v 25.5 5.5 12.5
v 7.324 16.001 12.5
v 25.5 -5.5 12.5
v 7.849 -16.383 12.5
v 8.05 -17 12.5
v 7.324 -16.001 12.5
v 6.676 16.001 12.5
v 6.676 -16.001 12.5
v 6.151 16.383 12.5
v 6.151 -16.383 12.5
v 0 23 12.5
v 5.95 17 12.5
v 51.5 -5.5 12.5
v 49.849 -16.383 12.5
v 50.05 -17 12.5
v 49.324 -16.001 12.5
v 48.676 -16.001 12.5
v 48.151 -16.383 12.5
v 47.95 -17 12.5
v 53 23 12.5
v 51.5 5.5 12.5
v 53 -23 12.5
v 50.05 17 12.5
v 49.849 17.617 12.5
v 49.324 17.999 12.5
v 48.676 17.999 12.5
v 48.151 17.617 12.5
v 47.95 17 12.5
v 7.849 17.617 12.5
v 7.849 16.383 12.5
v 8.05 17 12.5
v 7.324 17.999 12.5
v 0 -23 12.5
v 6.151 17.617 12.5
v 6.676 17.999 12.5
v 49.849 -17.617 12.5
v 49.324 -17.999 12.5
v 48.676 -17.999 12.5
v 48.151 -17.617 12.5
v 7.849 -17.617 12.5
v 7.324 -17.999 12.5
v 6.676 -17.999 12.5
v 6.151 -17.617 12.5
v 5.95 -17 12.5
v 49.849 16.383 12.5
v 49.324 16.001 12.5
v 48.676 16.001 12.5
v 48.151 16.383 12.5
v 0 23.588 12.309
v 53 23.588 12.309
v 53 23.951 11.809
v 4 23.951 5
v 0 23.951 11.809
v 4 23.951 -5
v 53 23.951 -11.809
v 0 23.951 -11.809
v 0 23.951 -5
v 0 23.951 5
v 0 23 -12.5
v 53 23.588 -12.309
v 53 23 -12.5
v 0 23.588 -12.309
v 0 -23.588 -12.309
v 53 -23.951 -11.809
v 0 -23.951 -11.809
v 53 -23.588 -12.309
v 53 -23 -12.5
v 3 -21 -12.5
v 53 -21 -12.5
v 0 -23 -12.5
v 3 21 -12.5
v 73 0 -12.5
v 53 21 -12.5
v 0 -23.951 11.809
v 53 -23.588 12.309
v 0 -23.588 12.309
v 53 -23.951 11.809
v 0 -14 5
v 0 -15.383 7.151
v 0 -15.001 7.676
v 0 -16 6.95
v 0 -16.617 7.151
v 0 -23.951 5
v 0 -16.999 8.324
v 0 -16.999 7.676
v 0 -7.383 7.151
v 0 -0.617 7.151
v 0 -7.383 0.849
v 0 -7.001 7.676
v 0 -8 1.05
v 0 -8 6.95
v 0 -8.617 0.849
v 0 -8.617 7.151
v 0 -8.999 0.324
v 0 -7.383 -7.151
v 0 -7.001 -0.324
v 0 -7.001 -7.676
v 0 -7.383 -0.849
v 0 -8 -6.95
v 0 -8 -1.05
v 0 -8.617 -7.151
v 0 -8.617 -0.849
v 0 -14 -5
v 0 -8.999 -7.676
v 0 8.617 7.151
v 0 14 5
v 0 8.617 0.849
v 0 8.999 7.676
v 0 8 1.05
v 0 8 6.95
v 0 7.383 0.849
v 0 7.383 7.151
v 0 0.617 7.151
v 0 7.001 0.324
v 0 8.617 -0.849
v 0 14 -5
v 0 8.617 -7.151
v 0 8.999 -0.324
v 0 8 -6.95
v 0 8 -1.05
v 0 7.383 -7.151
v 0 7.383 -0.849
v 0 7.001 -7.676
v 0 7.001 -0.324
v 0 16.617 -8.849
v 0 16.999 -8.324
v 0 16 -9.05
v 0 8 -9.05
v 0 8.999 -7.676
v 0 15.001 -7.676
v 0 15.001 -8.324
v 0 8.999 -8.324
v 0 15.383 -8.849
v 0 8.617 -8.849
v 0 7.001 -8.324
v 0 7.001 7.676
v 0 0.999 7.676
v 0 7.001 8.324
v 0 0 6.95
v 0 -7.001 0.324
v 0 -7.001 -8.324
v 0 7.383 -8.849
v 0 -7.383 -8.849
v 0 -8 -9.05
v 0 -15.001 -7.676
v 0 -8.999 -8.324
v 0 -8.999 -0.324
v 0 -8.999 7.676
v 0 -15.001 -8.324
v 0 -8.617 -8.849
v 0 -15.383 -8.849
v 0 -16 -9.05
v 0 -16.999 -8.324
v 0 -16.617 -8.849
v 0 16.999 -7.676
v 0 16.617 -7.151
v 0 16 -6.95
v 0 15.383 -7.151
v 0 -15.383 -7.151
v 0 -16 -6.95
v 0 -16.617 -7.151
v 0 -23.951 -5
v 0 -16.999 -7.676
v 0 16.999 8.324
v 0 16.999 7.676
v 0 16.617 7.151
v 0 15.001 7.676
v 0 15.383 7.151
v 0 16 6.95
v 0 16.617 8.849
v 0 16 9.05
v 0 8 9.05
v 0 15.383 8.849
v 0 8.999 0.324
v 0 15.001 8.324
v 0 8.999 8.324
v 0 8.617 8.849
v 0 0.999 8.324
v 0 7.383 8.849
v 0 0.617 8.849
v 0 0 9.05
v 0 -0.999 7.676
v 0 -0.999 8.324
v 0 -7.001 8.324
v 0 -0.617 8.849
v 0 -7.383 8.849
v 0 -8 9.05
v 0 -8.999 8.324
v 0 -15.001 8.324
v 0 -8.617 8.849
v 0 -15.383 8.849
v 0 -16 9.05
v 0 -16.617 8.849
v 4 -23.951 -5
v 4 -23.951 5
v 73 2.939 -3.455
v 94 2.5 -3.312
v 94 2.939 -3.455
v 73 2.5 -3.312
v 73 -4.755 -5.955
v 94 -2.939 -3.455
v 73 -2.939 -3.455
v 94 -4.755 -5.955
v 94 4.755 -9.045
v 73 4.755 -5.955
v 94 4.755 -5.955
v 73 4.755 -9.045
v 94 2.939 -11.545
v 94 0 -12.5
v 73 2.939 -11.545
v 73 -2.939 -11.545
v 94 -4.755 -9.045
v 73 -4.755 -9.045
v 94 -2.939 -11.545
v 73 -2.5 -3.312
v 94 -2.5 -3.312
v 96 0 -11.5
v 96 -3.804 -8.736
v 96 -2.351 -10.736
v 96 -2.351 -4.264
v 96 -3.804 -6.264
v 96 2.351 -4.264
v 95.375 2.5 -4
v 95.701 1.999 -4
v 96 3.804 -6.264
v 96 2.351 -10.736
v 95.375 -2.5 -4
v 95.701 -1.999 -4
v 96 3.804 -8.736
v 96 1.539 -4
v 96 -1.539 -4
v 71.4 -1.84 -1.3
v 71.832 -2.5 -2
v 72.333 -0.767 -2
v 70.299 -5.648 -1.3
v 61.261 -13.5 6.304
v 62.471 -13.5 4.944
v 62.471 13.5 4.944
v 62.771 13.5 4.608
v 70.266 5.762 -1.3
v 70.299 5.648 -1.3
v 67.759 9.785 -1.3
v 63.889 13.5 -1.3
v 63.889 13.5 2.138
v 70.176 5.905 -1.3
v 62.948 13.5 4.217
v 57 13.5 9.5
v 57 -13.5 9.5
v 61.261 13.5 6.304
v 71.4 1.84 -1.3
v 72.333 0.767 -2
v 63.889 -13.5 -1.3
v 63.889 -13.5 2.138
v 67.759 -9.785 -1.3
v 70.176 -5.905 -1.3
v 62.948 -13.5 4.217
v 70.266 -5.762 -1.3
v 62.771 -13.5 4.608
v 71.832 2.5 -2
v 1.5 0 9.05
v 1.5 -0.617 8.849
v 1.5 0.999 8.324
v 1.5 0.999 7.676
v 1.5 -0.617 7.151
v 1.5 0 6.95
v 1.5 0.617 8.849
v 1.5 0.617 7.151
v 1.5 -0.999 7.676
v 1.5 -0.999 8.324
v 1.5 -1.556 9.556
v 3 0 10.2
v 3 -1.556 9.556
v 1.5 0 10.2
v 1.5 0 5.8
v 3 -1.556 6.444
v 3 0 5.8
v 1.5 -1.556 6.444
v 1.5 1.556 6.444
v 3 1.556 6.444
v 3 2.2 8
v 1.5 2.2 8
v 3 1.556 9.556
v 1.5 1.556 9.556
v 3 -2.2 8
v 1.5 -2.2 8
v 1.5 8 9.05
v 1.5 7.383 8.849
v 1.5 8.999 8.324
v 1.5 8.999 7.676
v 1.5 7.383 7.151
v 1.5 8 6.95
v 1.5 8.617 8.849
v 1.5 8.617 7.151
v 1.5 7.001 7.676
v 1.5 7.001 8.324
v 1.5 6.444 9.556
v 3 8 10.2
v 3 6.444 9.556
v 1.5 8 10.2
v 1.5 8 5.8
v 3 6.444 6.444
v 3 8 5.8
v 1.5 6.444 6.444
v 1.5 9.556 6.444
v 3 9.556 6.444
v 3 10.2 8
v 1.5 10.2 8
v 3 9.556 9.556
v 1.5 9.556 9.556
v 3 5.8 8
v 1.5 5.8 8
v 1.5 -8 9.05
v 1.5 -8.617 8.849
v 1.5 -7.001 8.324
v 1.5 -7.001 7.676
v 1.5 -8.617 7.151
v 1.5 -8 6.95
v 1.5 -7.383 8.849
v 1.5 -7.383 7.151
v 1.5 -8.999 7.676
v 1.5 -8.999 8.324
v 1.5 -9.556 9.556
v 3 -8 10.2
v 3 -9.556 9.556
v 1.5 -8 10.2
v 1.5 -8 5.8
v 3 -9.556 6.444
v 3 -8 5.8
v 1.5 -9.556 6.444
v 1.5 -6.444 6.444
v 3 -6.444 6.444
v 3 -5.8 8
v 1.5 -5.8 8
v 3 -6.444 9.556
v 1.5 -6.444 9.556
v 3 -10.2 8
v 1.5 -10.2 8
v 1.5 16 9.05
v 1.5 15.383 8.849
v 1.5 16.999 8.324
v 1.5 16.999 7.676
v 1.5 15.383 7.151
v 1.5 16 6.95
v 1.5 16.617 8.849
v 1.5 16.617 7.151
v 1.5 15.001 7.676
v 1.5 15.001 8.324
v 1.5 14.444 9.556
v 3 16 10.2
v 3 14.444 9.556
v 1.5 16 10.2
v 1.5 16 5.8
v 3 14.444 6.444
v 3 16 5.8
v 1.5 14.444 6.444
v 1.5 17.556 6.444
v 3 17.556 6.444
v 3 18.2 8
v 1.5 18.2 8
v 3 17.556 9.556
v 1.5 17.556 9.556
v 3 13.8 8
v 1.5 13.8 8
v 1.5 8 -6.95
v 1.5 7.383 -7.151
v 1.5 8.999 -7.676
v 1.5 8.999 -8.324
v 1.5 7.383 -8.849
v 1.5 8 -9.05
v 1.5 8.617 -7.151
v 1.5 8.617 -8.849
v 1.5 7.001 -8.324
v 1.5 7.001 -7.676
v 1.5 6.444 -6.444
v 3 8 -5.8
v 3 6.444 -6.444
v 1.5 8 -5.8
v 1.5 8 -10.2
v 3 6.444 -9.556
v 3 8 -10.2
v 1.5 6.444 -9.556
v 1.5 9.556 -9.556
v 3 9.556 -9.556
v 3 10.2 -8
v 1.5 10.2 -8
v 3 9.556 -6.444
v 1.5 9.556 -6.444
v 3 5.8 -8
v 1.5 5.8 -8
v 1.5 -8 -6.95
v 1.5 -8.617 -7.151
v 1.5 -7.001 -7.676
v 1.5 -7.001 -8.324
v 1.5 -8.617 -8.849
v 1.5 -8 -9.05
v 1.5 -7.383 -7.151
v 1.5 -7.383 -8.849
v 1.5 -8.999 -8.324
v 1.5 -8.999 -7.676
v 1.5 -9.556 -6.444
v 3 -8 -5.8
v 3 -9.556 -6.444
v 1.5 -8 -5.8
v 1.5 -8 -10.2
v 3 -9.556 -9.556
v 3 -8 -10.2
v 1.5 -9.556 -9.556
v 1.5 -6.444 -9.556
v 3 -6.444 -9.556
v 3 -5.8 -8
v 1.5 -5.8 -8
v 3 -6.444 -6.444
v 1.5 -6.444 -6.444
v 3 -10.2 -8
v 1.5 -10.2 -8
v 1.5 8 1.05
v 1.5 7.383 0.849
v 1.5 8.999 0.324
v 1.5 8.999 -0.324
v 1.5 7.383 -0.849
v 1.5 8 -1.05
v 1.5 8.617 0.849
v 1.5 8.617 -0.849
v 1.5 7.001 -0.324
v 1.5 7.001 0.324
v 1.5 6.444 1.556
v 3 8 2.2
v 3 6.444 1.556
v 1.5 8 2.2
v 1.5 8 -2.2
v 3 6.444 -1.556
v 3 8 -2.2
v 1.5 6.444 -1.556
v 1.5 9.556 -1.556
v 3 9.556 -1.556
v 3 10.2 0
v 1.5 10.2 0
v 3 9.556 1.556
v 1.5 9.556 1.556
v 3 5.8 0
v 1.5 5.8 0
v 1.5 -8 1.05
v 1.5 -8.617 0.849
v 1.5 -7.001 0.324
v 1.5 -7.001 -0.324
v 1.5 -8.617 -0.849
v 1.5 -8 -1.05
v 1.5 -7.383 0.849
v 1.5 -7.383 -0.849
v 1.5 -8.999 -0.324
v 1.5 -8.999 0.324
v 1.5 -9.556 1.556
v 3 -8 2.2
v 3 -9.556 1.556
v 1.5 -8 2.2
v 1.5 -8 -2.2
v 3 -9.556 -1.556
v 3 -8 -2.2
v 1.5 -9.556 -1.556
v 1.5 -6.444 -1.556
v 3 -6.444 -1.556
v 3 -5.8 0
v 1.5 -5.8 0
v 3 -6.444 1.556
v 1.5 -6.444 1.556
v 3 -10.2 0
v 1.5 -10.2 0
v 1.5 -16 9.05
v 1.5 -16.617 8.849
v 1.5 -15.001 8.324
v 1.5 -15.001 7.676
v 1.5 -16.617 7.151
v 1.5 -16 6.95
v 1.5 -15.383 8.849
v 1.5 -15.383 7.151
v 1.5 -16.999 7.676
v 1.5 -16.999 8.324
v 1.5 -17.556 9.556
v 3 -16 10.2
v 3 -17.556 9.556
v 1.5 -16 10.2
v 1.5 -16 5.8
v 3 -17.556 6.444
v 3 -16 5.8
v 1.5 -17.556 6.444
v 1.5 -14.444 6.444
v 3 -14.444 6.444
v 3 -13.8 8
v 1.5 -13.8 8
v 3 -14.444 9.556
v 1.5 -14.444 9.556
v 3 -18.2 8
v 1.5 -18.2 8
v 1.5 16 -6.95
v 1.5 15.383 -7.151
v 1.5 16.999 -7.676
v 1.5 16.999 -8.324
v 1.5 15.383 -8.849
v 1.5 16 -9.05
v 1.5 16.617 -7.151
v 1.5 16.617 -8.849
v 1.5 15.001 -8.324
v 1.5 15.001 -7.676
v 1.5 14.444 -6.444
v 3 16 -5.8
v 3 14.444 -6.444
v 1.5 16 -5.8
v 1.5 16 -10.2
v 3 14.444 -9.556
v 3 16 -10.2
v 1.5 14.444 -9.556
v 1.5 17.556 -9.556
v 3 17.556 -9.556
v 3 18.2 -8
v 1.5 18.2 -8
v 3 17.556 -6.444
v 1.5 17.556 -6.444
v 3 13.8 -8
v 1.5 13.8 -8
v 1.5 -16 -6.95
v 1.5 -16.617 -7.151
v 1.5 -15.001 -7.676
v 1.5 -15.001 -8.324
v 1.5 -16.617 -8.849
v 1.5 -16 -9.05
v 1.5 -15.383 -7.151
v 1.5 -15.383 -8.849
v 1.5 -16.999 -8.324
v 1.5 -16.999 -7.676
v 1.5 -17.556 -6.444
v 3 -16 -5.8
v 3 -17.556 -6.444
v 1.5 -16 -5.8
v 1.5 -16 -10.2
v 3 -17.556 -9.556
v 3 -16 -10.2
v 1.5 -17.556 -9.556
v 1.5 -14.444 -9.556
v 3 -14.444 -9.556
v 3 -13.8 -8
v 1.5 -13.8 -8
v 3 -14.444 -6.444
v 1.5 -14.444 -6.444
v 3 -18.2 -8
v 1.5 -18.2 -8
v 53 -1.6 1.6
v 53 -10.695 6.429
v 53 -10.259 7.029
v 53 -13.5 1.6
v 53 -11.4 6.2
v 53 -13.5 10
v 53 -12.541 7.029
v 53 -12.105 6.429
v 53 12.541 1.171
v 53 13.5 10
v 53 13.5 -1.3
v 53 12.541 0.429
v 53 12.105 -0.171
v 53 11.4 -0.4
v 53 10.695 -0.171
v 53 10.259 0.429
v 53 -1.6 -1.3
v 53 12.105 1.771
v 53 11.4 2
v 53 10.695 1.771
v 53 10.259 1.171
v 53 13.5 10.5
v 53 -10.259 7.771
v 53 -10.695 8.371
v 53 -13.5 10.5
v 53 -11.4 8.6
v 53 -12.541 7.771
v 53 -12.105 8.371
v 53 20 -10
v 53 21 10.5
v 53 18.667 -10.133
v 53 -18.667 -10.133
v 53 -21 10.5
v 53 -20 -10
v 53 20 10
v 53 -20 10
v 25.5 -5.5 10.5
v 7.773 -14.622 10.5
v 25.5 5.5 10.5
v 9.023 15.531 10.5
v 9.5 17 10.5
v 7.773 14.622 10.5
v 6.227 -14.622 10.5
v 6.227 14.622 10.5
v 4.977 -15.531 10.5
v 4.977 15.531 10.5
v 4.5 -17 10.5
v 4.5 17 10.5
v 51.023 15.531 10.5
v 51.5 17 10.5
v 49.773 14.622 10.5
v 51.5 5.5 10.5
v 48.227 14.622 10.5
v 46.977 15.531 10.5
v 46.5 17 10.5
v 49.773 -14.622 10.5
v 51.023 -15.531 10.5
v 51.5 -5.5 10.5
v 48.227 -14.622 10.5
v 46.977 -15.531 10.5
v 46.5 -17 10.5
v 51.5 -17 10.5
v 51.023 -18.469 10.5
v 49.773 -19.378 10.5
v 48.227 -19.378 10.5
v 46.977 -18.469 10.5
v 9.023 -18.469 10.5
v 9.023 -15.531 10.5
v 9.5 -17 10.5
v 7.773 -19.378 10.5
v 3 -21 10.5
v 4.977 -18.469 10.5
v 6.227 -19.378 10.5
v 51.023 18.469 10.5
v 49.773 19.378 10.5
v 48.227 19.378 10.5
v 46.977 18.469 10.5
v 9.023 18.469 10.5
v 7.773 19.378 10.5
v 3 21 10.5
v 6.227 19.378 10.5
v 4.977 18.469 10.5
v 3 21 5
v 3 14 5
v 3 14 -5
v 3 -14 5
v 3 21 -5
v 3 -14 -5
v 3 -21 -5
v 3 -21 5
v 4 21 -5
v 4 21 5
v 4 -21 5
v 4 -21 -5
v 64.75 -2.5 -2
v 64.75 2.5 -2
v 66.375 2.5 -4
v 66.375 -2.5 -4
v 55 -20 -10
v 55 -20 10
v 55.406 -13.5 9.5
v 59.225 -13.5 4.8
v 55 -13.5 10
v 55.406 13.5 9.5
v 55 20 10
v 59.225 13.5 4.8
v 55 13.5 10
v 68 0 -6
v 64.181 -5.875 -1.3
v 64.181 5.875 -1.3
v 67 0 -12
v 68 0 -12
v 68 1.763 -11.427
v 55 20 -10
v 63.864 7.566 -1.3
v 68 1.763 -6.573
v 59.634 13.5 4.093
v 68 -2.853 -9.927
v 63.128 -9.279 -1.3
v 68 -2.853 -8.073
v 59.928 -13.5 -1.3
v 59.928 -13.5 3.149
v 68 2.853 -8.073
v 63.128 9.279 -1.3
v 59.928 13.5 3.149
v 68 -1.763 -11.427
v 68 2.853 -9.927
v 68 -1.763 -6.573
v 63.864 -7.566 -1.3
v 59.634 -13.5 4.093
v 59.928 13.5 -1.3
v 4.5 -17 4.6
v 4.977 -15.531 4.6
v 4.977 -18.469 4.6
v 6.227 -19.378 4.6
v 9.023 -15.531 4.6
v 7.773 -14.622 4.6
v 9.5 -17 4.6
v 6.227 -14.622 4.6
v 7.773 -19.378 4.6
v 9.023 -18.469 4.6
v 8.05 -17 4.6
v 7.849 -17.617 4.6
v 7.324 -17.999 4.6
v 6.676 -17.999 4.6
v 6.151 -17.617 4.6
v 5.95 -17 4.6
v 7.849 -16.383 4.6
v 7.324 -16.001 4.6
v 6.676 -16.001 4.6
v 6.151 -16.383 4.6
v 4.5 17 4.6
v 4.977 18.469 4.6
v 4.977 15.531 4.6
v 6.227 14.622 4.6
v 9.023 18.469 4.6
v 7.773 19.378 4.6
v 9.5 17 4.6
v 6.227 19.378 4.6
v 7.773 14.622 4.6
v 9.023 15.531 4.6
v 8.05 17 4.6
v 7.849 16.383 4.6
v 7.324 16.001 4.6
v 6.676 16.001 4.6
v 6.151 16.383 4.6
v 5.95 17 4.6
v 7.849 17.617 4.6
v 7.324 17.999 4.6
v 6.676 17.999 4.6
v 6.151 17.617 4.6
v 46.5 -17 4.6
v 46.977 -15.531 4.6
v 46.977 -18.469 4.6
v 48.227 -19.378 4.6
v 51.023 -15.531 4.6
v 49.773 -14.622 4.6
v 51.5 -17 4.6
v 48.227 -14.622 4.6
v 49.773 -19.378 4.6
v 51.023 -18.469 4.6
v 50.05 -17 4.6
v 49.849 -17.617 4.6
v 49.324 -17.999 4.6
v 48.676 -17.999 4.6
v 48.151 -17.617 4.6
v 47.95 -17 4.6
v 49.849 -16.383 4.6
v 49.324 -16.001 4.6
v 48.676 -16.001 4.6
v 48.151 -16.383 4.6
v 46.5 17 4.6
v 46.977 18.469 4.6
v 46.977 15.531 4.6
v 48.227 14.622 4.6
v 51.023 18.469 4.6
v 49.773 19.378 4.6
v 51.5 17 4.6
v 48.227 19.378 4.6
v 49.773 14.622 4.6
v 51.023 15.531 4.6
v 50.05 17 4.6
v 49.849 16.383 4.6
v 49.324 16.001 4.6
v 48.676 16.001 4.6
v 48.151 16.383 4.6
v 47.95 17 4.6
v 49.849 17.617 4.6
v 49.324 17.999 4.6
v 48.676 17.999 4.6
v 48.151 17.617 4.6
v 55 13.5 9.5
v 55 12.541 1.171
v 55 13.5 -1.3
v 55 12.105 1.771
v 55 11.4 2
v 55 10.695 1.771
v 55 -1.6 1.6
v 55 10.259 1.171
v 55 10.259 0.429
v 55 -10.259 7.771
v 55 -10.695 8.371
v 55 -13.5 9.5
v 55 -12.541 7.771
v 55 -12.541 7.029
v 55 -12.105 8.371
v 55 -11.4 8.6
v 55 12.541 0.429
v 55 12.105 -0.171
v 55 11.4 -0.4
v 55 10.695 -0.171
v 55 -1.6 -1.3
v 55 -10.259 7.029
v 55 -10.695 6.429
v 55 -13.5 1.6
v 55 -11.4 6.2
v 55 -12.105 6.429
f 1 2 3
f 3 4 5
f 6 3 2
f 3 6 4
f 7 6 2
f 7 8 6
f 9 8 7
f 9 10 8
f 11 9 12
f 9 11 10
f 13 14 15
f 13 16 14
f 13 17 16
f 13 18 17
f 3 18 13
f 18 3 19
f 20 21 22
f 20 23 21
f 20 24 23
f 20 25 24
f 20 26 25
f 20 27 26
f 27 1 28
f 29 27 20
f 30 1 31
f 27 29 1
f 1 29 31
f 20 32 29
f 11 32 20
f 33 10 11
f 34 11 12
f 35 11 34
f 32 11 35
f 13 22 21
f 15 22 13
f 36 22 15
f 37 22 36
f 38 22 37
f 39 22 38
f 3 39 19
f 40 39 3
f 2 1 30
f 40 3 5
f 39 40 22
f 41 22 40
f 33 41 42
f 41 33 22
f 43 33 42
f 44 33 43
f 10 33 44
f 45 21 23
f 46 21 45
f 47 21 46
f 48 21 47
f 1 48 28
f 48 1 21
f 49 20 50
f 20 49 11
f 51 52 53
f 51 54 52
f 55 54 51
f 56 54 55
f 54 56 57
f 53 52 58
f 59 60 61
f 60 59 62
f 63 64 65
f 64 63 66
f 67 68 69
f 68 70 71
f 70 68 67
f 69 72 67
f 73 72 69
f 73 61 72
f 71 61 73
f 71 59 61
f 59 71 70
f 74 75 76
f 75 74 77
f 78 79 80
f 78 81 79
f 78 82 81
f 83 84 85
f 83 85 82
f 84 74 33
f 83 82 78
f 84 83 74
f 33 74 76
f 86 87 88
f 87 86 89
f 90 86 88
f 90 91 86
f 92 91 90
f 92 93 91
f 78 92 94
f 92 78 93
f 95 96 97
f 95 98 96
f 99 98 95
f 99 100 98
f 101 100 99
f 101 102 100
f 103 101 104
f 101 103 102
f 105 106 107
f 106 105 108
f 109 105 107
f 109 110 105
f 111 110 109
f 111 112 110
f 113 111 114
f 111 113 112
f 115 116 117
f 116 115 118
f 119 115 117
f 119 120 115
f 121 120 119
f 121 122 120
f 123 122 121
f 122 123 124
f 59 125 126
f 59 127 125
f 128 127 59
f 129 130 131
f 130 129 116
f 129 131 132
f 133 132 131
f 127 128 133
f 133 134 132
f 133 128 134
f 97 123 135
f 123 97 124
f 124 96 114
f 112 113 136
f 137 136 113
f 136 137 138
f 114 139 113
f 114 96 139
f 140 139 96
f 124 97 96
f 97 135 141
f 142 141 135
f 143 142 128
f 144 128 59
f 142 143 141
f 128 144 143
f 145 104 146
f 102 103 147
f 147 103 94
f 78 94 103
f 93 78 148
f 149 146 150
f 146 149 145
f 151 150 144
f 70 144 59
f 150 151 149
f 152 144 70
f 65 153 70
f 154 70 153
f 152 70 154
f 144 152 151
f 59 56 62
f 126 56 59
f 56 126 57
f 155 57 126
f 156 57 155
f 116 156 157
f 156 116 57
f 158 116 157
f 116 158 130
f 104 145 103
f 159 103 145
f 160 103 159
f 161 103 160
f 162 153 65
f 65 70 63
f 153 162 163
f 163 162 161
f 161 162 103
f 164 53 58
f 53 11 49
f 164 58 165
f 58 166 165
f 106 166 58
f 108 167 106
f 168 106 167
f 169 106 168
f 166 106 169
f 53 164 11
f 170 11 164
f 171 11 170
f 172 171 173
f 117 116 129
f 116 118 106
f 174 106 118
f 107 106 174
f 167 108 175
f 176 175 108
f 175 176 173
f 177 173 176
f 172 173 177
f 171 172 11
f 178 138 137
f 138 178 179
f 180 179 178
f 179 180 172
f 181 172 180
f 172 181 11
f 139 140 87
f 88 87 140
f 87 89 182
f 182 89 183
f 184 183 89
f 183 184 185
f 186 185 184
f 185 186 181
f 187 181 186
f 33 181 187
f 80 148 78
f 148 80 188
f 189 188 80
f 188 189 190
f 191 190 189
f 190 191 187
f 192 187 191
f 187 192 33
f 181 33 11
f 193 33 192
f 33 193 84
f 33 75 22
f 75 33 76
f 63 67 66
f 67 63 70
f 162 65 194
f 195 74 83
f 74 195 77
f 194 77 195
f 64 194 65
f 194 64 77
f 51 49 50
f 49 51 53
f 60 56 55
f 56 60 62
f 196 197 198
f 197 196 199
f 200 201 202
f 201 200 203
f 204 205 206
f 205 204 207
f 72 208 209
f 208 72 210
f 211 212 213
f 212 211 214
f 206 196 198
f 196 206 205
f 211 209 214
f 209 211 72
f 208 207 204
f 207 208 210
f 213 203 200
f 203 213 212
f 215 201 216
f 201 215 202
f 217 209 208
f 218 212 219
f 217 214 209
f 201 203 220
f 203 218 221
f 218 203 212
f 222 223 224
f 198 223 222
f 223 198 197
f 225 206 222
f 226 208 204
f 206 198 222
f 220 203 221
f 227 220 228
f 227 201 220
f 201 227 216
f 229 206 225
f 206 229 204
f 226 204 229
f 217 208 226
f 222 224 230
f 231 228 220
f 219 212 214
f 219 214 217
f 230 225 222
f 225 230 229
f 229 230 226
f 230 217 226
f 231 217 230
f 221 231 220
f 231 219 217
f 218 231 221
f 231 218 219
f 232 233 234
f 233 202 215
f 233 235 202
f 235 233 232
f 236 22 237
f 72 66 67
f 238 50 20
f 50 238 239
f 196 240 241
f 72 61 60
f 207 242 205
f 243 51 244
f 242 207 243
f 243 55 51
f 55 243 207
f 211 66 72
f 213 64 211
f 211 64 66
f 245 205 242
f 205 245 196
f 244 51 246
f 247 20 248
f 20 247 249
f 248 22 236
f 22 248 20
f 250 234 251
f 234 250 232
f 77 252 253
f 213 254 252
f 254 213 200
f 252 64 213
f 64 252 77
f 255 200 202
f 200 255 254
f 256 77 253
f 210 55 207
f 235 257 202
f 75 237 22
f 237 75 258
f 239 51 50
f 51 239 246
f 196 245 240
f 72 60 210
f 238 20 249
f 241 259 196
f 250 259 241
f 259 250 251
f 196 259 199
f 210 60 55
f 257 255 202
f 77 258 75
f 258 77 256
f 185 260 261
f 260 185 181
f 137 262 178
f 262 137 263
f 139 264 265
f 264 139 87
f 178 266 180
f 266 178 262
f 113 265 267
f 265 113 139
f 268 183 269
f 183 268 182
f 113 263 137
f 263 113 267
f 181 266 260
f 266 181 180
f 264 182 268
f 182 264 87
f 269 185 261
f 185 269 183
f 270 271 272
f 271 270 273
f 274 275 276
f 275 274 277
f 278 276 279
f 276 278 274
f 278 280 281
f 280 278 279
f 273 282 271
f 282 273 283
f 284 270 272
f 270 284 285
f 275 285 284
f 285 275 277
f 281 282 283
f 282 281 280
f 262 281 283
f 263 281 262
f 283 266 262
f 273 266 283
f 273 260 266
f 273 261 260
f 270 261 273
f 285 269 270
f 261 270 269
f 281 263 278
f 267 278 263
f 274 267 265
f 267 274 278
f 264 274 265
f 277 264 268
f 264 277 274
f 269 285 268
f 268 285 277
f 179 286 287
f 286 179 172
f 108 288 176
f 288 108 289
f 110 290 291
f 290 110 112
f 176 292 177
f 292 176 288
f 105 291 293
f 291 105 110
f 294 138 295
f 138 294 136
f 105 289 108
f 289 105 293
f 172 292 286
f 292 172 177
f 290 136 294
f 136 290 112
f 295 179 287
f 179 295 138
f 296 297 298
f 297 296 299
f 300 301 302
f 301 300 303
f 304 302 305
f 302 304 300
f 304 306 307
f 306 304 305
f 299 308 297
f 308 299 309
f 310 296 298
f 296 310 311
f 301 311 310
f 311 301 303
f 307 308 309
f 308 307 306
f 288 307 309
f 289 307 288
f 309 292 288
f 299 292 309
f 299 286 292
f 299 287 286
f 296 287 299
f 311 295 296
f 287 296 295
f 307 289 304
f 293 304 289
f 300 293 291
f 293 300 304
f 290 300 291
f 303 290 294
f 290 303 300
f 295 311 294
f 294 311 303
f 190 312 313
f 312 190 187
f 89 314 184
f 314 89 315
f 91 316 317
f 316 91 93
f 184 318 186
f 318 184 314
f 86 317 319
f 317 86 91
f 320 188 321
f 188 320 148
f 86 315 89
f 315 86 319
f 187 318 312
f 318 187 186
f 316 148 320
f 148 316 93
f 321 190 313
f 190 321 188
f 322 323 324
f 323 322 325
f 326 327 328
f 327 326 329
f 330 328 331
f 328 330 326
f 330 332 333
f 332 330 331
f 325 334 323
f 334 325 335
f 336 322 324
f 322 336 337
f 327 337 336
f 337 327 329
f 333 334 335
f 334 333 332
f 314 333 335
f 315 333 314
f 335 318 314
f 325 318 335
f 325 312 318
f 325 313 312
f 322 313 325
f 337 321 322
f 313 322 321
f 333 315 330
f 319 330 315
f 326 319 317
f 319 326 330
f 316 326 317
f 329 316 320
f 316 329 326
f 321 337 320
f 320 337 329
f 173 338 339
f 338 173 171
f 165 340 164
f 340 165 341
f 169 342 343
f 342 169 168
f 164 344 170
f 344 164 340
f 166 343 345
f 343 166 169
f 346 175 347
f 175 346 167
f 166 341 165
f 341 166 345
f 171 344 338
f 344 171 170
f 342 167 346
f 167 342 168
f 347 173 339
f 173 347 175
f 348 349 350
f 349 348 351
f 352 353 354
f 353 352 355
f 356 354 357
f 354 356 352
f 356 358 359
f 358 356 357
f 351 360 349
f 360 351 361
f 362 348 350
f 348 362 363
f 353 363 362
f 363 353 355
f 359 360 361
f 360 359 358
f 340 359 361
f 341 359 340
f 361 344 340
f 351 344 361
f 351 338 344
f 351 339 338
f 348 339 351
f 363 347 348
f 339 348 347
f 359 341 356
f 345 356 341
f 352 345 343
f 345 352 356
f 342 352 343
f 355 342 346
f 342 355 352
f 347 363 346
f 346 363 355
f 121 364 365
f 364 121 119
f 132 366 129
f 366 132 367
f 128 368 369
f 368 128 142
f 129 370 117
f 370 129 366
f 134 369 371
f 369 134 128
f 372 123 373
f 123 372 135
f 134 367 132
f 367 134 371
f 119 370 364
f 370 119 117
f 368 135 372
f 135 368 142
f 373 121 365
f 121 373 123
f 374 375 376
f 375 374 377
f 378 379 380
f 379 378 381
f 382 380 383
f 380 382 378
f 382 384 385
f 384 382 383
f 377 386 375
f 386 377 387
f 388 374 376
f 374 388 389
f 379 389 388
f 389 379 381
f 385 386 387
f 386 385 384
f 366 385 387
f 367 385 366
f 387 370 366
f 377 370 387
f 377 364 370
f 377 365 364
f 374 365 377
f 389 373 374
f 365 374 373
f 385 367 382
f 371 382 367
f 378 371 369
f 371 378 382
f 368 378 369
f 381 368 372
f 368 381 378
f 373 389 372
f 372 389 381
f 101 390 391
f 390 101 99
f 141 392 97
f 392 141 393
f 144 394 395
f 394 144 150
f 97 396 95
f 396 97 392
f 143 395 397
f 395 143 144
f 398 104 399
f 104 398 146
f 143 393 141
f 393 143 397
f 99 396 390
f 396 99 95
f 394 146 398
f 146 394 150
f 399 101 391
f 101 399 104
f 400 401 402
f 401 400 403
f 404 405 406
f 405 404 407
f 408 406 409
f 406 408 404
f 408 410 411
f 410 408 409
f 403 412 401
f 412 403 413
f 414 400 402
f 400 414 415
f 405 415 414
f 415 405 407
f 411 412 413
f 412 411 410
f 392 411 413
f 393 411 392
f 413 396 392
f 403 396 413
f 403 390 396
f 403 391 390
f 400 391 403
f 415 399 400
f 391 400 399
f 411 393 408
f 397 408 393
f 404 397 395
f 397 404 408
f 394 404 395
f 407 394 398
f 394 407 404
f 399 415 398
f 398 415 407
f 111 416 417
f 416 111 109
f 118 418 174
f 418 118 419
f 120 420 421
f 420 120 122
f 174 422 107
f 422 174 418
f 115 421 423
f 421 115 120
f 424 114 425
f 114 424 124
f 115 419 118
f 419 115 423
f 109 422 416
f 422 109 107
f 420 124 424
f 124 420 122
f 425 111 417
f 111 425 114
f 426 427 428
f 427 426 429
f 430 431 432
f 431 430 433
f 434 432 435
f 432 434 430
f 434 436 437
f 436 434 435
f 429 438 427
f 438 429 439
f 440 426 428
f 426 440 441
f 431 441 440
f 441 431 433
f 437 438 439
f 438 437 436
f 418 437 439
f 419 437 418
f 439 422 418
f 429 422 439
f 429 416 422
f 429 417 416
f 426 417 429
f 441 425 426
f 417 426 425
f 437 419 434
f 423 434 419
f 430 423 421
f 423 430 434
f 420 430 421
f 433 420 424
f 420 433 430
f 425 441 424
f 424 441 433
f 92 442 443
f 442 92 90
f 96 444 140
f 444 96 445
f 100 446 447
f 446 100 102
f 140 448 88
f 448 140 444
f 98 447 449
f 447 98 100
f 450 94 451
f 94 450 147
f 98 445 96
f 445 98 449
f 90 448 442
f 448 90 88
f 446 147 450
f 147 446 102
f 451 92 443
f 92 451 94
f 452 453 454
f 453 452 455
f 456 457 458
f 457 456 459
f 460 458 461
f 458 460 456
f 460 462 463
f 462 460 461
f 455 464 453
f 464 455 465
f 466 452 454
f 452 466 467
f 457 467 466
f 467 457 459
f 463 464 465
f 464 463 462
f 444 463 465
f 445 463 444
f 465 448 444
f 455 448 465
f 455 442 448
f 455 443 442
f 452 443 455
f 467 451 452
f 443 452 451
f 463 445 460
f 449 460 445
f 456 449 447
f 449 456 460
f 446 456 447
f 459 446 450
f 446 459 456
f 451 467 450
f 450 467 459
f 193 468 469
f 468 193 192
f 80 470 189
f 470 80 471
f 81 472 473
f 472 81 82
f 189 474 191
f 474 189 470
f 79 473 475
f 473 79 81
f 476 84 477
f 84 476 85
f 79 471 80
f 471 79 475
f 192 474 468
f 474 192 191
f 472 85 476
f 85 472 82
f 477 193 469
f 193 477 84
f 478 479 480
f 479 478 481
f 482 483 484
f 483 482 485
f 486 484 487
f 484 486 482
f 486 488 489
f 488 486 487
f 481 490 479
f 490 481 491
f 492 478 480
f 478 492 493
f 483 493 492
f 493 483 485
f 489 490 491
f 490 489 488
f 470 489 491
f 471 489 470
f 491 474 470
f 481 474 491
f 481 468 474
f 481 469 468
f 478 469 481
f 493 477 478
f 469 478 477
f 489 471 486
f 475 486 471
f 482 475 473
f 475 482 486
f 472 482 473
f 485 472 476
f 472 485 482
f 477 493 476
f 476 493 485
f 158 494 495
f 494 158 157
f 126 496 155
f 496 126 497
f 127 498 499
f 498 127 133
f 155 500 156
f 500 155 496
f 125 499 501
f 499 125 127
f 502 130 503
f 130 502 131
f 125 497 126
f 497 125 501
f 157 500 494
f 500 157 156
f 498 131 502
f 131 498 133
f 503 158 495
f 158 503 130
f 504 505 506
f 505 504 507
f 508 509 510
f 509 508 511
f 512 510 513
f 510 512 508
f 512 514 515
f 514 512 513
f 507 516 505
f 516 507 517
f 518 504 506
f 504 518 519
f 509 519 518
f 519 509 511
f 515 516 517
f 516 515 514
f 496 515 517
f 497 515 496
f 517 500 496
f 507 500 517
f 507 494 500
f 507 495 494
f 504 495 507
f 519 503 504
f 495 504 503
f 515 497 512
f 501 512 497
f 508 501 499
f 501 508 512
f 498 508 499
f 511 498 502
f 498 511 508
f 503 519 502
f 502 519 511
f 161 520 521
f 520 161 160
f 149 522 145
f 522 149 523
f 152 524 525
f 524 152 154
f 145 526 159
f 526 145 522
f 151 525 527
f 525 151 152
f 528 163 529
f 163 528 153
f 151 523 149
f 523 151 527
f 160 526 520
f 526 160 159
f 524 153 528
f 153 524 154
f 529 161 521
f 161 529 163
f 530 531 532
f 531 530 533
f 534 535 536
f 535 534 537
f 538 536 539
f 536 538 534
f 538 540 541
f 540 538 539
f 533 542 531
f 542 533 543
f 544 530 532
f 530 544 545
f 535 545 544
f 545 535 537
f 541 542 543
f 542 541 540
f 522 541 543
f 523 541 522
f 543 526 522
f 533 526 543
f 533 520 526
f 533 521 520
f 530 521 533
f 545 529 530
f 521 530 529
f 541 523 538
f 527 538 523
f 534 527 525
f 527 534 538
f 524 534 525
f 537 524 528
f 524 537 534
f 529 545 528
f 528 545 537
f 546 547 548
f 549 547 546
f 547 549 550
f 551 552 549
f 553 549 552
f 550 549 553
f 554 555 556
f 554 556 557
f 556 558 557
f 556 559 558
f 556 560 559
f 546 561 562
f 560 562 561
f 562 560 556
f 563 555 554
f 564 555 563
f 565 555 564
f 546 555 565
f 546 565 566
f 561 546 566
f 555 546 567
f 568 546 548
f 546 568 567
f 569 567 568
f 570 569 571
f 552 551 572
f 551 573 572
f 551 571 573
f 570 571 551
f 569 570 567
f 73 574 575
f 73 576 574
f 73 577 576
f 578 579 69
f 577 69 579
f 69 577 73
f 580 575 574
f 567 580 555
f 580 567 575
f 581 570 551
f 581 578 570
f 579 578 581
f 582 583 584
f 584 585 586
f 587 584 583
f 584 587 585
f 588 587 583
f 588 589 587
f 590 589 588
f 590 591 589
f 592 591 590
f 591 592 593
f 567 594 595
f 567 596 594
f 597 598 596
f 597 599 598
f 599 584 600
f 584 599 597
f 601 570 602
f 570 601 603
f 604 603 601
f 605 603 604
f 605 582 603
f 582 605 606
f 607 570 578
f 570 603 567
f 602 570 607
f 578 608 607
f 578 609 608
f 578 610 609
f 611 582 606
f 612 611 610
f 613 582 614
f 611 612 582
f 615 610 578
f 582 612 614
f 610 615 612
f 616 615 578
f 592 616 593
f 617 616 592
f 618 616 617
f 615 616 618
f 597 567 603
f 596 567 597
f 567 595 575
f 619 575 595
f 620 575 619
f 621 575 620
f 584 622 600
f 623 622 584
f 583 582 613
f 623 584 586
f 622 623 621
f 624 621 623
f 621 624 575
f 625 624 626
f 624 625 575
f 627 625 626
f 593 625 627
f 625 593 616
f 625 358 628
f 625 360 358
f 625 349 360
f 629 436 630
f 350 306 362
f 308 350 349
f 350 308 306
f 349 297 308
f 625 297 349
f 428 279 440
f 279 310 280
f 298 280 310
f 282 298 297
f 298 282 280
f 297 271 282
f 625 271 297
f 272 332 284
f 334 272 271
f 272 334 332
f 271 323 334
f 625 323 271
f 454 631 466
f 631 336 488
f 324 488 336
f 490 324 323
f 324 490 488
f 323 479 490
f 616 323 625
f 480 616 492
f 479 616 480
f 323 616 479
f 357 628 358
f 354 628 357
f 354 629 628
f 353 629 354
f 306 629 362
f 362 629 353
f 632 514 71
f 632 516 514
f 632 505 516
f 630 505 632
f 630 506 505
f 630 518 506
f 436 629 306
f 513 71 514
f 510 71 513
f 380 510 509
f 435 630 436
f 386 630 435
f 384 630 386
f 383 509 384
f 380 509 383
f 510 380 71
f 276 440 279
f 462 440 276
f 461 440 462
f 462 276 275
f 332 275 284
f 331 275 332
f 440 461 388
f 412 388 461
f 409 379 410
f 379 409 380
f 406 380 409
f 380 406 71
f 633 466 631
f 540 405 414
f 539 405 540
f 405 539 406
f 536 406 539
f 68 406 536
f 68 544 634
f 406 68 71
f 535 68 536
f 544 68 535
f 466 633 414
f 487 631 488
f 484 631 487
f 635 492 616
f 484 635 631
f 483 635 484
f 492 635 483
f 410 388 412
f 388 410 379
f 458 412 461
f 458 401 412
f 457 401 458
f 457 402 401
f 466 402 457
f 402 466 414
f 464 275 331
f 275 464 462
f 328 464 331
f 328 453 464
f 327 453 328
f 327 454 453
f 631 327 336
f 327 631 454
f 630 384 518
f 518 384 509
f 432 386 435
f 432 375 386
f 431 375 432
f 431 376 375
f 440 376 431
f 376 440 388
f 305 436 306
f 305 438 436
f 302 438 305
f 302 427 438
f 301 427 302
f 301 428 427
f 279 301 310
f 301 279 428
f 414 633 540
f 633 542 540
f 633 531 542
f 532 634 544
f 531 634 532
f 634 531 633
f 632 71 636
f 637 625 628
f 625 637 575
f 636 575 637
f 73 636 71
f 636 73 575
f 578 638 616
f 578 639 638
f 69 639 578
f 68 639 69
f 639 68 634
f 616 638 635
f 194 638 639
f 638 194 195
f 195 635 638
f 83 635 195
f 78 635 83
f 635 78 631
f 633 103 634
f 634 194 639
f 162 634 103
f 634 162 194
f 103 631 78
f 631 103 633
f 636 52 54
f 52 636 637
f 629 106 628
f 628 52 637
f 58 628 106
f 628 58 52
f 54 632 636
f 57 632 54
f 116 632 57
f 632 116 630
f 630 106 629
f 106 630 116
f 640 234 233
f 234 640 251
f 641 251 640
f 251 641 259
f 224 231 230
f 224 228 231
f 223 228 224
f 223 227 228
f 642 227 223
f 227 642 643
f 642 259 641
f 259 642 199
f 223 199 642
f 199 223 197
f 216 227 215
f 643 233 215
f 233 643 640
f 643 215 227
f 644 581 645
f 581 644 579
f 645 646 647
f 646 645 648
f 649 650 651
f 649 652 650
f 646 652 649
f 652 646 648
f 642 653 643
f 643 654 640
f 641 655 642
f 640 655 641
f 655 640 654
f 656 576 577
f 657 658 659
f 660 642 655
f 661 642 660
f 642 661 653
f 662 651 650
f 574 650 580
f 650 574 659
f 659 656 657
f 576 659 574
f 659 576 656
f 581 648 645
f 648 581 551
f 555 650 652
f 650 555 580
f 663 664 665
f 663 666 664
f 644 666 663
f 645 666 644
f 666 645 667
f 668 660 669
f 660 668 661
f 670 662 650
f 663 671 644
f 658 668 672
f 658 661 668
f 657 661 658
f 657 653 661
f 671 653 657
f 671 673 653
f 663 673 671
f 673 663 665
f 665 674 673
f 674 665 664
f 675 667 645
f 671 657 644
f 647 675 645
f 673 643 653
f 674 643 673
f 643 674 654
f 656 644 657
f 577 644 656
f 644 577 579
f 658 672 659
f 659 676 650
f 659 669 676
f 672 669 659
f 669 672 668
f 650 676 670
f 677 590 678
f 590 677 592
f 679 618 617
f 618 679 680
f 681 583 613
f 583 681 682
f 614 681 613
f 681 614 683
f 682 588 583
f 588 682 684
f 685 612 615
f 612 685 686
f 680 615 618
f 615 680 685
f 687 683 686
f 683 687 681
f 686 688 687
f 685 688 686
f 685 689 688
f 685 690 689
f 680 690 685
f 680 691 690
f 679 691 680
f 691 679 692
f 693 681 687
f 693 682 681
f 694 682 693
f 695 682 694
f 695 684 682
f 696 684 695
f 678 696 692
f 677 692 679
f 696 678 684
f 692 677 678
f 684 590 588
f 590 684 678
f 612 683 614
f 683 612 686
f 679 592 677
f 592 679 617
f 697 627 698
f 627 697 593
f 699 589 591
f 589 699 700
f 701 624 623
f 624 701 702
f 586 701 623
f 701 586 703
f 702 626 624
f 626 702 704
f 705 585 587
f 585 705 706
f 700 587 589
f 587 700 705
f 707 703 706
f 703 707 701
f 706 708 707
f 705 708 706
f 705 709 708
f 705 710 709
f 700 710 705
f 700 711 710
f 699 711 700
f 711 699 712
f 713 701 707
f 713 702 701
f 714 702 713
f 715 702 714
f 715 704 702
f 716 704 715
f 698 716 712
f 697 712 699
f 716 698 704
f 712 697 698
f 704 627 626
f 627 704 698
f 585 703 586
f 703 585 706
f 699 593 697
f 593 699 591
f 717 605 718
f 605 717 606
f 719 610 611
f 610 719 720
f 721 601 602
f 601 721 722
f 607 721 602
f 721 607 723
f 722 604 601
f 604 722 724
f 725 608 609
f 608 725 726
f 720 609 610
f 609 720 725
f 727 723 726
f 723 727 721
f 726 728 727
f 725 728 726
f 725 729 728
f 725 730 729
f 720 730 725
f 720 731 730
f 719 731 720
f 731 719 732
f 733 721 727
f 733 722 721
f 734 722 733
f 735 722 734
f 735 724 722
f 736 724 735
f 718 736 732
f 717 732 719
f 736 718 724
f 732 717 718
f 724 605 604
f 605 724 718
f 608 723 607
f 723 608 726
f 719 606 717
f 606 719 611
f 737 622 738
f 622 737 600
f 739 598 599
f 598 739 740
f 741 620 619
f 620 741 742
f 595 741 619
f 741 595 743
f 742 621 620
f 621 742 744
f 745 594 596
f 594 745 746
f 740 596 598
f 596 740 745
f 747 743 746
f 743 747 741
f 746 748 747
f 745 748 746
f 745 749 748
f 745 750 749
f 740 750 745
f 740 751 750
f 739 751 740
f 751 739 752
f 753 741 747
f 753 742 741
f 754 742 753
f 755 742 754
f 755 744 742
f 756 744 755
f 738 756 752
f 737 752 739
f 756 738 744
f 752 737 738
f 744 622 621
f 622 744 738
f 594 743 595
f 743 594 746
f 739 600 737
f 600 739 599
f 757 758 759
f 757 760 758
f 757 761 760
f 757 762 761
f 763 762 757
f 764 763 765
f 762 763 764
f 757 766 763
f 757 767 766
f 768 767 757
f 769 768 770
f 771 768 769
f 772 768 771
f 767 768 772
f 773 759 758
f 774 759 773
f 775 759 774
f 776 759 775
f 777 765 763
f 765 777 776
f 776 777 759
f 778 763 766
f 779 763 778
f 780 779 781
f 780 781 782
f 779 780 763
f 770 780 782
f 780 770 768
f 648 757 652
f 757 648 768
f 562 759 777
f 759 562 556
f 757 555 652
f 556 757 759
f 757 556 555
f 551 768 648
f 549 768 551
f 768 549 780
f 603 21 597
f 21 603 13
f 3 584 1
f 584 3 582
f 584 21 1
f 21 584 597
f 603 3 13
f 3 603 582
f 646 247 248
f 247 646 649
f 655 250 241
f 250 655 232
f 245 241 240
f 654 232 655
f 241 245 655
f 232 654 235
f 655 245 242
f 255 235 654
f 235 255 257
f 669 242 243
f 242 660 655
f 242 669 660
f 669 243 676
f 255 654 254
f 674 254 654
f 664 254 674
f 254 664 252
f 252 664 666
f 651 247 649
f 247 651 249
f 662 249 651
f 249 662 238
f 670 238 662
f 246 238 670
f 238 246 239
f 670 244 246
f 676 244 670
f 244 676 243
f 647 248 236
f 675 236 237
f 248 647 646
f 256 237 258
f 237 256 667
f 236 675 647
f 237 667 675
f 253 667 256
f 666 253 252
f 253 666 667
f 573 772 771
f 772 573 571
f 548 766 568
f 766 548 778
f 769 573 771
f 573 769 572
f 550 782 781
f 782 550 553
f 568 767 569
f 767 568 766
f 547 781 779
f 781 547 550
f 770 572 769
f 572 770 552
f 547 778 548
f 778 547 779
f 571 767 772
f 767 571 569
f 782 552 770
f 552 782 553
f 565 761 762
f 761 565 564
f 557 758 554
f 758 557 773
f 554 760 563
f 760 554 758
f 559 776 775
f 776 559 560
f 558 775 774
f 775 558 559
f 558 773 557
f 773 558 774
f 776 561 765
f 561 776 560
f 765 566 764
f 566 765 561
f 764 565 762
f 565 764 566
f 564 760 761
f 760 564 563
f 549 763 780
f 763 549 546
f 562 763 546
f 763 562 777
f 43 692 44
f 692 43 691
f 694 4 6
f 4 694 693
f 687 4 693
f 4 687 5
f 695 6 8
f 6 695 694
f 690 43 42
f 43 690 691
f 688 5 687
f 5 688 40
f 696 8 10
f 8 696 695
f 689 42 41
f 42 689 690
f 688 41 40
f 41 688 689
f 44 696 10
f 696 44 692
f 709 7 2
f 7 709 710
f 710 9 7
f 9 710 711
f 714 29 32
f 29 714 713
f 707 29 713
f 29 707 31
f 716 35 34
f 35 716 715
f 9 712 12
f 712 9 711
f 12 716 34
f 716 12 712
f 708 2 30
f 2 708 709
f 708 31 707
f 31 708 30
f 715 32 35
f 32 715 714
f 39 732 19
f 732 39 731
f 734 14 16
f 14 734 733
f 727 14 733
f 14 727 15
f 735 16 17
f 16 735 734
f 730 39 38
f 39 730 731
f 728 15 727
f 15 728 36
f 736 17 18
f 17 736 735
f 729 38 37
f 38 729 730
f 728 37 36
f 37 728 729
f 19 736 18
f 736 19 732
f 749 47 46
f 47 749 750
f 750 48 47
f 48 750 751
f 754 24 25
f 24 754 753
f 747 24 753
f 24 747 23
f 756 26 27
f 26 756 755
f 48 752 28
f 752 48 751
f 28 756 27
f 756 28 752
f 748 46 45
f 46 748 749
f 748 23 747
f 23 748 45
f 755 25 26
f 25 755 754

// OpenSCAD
$fn=10;



module patoune(render)
{
	if(render == 1 )
	{
	difference ()
	{
	union()
	{
	difference ()
	{
		union()
		{

			translate ([0,-25,-13.5])		minkowski()
			{
				translate ([0,1,1]) rotate([0,90,0]) cylinder (r=1, h=26.5);
				translate ([0,1,1])cube ([26.5,46,23]);
			}
			translate ([72 , 0,-7.5]) rotate([0,90,0]) cylinder (r=5, h=22);
			translate ([94 , 0,-7.5]) rotate([0,90,0]) cylinder (r1=5,r2=4,h=2);
			union()
			{
				hull()
				{
					translate ([50,-25,-13.5])		minkowski()
					{
						translate ([0,1,1]) rotate([0,90,0]) cylinder (r=1, h=1.5);
						translate ([0,1,1])cube ([1.5,46,23]);
					}
					translate ([72 , 0,-7.5]) rotate([0,90,0]) cylinder (r=5, h=1);
				}
			}
		}

		union()
		{
				translate ([3,-21,-13.5])	cube ([50,42,24]);
				translate ([0 , 0,8]) Viss2M() ;
				translate ([0 , 8,8]) Viss2M() ;
				translate ([0 , -8,8]) Viss2M() ;
				translate ([0 , 16,8]) Viss2M() ;
				translate ([0 , 8, -8]) Viss2M() ;
				translate ([0 , -8,-8]) Viss2M() ;
				translate ([0 , 8,0]) Viss2M() ;
				translate ([0 , -8,0]) Viss2M() ;

				translate ([0 , -16,8]) Viss2M() ;
				translate ([0 , 16,-8]) Viss2M() ;
				translate ([0 , -16,-8]) Viss2M() ;

				translate ([-1,-25,-5]) cube ([5,11,10]);
				translate ([-1, 14,-5]) cube ([5,11,10]);
		
				//translate ([25,-21,-10.5]) cube ([25,42,25]);
				translate ([64,-2.5,-4]) cube ([33,5,2]);
				hull()
				{
					translate ([52,-20,-10]) cube ([3,40,20]);
					translate ([67 , 0,-9]) rotate([0,90,0]) cylinder (r=3, h=1);
				}
		}
	}
		union()
		{
			translate ([7 , -17,+4.6]) cylinder (r=2.5, h=7.9);
			translate ([7 , +17,+4.6]) cylinder (r=2.5, h=7.9);
			translate ([49 , -17,+4.6]) cylinder (r=2.5, h=7.9);
			translate ([49 , +17,+4.6]) cylinder (r=2.5, h=7.9);
			translate ([53,-13.5,-1.3]) cube ([2,27,11.8]);

		}

	}
		union()
		{
			translate ([25.5,-5.5,10]) cube ([26,11,6.5]);
			translate ([55,-13.5,-1.3]) cube ([20,27,10.8]);
			translate ([52,-11.4,7.4]) rotate([0,90,0]) cylinder (r=1.2, h=4);
			translate ([52,+11.4,0.8]) rotate([0,90,0]) cylinder (r=1.2, h=4);
			translate ([52,-13.6,-1.4]) cube ([4,12,3]);
			translate ([7 , -17,+4.5]) cylinder (r=1.05, h=9);
			translate ([7 , +17,+4.5]) cylinder (r=1.05, h=9);
			translate ([49 , -17,+4.5]) cylinder (r=1.05, h=9);
			translate ([49 , +17,+4.5]) cylinder (r=1.05, h=9);

		}
	}
	}
	else
	{
		translate ([0,-25,-13.5])cube ([50,46,23]);
		translate ([50 , 0,-7.5]) rotate([0,90,0]) cylinder (r=5, h=44);
	}
}
module Viss2M()
{
	translate ([-1 , 0,0]) rotate([0,90,0]) cylinder (r=1.05, h=7);
	translate ([1.5 , 0,0]) rotate([0,90,0]) cylinder (r=2.2, h=7,$fn=8);
}

patoune(1);
